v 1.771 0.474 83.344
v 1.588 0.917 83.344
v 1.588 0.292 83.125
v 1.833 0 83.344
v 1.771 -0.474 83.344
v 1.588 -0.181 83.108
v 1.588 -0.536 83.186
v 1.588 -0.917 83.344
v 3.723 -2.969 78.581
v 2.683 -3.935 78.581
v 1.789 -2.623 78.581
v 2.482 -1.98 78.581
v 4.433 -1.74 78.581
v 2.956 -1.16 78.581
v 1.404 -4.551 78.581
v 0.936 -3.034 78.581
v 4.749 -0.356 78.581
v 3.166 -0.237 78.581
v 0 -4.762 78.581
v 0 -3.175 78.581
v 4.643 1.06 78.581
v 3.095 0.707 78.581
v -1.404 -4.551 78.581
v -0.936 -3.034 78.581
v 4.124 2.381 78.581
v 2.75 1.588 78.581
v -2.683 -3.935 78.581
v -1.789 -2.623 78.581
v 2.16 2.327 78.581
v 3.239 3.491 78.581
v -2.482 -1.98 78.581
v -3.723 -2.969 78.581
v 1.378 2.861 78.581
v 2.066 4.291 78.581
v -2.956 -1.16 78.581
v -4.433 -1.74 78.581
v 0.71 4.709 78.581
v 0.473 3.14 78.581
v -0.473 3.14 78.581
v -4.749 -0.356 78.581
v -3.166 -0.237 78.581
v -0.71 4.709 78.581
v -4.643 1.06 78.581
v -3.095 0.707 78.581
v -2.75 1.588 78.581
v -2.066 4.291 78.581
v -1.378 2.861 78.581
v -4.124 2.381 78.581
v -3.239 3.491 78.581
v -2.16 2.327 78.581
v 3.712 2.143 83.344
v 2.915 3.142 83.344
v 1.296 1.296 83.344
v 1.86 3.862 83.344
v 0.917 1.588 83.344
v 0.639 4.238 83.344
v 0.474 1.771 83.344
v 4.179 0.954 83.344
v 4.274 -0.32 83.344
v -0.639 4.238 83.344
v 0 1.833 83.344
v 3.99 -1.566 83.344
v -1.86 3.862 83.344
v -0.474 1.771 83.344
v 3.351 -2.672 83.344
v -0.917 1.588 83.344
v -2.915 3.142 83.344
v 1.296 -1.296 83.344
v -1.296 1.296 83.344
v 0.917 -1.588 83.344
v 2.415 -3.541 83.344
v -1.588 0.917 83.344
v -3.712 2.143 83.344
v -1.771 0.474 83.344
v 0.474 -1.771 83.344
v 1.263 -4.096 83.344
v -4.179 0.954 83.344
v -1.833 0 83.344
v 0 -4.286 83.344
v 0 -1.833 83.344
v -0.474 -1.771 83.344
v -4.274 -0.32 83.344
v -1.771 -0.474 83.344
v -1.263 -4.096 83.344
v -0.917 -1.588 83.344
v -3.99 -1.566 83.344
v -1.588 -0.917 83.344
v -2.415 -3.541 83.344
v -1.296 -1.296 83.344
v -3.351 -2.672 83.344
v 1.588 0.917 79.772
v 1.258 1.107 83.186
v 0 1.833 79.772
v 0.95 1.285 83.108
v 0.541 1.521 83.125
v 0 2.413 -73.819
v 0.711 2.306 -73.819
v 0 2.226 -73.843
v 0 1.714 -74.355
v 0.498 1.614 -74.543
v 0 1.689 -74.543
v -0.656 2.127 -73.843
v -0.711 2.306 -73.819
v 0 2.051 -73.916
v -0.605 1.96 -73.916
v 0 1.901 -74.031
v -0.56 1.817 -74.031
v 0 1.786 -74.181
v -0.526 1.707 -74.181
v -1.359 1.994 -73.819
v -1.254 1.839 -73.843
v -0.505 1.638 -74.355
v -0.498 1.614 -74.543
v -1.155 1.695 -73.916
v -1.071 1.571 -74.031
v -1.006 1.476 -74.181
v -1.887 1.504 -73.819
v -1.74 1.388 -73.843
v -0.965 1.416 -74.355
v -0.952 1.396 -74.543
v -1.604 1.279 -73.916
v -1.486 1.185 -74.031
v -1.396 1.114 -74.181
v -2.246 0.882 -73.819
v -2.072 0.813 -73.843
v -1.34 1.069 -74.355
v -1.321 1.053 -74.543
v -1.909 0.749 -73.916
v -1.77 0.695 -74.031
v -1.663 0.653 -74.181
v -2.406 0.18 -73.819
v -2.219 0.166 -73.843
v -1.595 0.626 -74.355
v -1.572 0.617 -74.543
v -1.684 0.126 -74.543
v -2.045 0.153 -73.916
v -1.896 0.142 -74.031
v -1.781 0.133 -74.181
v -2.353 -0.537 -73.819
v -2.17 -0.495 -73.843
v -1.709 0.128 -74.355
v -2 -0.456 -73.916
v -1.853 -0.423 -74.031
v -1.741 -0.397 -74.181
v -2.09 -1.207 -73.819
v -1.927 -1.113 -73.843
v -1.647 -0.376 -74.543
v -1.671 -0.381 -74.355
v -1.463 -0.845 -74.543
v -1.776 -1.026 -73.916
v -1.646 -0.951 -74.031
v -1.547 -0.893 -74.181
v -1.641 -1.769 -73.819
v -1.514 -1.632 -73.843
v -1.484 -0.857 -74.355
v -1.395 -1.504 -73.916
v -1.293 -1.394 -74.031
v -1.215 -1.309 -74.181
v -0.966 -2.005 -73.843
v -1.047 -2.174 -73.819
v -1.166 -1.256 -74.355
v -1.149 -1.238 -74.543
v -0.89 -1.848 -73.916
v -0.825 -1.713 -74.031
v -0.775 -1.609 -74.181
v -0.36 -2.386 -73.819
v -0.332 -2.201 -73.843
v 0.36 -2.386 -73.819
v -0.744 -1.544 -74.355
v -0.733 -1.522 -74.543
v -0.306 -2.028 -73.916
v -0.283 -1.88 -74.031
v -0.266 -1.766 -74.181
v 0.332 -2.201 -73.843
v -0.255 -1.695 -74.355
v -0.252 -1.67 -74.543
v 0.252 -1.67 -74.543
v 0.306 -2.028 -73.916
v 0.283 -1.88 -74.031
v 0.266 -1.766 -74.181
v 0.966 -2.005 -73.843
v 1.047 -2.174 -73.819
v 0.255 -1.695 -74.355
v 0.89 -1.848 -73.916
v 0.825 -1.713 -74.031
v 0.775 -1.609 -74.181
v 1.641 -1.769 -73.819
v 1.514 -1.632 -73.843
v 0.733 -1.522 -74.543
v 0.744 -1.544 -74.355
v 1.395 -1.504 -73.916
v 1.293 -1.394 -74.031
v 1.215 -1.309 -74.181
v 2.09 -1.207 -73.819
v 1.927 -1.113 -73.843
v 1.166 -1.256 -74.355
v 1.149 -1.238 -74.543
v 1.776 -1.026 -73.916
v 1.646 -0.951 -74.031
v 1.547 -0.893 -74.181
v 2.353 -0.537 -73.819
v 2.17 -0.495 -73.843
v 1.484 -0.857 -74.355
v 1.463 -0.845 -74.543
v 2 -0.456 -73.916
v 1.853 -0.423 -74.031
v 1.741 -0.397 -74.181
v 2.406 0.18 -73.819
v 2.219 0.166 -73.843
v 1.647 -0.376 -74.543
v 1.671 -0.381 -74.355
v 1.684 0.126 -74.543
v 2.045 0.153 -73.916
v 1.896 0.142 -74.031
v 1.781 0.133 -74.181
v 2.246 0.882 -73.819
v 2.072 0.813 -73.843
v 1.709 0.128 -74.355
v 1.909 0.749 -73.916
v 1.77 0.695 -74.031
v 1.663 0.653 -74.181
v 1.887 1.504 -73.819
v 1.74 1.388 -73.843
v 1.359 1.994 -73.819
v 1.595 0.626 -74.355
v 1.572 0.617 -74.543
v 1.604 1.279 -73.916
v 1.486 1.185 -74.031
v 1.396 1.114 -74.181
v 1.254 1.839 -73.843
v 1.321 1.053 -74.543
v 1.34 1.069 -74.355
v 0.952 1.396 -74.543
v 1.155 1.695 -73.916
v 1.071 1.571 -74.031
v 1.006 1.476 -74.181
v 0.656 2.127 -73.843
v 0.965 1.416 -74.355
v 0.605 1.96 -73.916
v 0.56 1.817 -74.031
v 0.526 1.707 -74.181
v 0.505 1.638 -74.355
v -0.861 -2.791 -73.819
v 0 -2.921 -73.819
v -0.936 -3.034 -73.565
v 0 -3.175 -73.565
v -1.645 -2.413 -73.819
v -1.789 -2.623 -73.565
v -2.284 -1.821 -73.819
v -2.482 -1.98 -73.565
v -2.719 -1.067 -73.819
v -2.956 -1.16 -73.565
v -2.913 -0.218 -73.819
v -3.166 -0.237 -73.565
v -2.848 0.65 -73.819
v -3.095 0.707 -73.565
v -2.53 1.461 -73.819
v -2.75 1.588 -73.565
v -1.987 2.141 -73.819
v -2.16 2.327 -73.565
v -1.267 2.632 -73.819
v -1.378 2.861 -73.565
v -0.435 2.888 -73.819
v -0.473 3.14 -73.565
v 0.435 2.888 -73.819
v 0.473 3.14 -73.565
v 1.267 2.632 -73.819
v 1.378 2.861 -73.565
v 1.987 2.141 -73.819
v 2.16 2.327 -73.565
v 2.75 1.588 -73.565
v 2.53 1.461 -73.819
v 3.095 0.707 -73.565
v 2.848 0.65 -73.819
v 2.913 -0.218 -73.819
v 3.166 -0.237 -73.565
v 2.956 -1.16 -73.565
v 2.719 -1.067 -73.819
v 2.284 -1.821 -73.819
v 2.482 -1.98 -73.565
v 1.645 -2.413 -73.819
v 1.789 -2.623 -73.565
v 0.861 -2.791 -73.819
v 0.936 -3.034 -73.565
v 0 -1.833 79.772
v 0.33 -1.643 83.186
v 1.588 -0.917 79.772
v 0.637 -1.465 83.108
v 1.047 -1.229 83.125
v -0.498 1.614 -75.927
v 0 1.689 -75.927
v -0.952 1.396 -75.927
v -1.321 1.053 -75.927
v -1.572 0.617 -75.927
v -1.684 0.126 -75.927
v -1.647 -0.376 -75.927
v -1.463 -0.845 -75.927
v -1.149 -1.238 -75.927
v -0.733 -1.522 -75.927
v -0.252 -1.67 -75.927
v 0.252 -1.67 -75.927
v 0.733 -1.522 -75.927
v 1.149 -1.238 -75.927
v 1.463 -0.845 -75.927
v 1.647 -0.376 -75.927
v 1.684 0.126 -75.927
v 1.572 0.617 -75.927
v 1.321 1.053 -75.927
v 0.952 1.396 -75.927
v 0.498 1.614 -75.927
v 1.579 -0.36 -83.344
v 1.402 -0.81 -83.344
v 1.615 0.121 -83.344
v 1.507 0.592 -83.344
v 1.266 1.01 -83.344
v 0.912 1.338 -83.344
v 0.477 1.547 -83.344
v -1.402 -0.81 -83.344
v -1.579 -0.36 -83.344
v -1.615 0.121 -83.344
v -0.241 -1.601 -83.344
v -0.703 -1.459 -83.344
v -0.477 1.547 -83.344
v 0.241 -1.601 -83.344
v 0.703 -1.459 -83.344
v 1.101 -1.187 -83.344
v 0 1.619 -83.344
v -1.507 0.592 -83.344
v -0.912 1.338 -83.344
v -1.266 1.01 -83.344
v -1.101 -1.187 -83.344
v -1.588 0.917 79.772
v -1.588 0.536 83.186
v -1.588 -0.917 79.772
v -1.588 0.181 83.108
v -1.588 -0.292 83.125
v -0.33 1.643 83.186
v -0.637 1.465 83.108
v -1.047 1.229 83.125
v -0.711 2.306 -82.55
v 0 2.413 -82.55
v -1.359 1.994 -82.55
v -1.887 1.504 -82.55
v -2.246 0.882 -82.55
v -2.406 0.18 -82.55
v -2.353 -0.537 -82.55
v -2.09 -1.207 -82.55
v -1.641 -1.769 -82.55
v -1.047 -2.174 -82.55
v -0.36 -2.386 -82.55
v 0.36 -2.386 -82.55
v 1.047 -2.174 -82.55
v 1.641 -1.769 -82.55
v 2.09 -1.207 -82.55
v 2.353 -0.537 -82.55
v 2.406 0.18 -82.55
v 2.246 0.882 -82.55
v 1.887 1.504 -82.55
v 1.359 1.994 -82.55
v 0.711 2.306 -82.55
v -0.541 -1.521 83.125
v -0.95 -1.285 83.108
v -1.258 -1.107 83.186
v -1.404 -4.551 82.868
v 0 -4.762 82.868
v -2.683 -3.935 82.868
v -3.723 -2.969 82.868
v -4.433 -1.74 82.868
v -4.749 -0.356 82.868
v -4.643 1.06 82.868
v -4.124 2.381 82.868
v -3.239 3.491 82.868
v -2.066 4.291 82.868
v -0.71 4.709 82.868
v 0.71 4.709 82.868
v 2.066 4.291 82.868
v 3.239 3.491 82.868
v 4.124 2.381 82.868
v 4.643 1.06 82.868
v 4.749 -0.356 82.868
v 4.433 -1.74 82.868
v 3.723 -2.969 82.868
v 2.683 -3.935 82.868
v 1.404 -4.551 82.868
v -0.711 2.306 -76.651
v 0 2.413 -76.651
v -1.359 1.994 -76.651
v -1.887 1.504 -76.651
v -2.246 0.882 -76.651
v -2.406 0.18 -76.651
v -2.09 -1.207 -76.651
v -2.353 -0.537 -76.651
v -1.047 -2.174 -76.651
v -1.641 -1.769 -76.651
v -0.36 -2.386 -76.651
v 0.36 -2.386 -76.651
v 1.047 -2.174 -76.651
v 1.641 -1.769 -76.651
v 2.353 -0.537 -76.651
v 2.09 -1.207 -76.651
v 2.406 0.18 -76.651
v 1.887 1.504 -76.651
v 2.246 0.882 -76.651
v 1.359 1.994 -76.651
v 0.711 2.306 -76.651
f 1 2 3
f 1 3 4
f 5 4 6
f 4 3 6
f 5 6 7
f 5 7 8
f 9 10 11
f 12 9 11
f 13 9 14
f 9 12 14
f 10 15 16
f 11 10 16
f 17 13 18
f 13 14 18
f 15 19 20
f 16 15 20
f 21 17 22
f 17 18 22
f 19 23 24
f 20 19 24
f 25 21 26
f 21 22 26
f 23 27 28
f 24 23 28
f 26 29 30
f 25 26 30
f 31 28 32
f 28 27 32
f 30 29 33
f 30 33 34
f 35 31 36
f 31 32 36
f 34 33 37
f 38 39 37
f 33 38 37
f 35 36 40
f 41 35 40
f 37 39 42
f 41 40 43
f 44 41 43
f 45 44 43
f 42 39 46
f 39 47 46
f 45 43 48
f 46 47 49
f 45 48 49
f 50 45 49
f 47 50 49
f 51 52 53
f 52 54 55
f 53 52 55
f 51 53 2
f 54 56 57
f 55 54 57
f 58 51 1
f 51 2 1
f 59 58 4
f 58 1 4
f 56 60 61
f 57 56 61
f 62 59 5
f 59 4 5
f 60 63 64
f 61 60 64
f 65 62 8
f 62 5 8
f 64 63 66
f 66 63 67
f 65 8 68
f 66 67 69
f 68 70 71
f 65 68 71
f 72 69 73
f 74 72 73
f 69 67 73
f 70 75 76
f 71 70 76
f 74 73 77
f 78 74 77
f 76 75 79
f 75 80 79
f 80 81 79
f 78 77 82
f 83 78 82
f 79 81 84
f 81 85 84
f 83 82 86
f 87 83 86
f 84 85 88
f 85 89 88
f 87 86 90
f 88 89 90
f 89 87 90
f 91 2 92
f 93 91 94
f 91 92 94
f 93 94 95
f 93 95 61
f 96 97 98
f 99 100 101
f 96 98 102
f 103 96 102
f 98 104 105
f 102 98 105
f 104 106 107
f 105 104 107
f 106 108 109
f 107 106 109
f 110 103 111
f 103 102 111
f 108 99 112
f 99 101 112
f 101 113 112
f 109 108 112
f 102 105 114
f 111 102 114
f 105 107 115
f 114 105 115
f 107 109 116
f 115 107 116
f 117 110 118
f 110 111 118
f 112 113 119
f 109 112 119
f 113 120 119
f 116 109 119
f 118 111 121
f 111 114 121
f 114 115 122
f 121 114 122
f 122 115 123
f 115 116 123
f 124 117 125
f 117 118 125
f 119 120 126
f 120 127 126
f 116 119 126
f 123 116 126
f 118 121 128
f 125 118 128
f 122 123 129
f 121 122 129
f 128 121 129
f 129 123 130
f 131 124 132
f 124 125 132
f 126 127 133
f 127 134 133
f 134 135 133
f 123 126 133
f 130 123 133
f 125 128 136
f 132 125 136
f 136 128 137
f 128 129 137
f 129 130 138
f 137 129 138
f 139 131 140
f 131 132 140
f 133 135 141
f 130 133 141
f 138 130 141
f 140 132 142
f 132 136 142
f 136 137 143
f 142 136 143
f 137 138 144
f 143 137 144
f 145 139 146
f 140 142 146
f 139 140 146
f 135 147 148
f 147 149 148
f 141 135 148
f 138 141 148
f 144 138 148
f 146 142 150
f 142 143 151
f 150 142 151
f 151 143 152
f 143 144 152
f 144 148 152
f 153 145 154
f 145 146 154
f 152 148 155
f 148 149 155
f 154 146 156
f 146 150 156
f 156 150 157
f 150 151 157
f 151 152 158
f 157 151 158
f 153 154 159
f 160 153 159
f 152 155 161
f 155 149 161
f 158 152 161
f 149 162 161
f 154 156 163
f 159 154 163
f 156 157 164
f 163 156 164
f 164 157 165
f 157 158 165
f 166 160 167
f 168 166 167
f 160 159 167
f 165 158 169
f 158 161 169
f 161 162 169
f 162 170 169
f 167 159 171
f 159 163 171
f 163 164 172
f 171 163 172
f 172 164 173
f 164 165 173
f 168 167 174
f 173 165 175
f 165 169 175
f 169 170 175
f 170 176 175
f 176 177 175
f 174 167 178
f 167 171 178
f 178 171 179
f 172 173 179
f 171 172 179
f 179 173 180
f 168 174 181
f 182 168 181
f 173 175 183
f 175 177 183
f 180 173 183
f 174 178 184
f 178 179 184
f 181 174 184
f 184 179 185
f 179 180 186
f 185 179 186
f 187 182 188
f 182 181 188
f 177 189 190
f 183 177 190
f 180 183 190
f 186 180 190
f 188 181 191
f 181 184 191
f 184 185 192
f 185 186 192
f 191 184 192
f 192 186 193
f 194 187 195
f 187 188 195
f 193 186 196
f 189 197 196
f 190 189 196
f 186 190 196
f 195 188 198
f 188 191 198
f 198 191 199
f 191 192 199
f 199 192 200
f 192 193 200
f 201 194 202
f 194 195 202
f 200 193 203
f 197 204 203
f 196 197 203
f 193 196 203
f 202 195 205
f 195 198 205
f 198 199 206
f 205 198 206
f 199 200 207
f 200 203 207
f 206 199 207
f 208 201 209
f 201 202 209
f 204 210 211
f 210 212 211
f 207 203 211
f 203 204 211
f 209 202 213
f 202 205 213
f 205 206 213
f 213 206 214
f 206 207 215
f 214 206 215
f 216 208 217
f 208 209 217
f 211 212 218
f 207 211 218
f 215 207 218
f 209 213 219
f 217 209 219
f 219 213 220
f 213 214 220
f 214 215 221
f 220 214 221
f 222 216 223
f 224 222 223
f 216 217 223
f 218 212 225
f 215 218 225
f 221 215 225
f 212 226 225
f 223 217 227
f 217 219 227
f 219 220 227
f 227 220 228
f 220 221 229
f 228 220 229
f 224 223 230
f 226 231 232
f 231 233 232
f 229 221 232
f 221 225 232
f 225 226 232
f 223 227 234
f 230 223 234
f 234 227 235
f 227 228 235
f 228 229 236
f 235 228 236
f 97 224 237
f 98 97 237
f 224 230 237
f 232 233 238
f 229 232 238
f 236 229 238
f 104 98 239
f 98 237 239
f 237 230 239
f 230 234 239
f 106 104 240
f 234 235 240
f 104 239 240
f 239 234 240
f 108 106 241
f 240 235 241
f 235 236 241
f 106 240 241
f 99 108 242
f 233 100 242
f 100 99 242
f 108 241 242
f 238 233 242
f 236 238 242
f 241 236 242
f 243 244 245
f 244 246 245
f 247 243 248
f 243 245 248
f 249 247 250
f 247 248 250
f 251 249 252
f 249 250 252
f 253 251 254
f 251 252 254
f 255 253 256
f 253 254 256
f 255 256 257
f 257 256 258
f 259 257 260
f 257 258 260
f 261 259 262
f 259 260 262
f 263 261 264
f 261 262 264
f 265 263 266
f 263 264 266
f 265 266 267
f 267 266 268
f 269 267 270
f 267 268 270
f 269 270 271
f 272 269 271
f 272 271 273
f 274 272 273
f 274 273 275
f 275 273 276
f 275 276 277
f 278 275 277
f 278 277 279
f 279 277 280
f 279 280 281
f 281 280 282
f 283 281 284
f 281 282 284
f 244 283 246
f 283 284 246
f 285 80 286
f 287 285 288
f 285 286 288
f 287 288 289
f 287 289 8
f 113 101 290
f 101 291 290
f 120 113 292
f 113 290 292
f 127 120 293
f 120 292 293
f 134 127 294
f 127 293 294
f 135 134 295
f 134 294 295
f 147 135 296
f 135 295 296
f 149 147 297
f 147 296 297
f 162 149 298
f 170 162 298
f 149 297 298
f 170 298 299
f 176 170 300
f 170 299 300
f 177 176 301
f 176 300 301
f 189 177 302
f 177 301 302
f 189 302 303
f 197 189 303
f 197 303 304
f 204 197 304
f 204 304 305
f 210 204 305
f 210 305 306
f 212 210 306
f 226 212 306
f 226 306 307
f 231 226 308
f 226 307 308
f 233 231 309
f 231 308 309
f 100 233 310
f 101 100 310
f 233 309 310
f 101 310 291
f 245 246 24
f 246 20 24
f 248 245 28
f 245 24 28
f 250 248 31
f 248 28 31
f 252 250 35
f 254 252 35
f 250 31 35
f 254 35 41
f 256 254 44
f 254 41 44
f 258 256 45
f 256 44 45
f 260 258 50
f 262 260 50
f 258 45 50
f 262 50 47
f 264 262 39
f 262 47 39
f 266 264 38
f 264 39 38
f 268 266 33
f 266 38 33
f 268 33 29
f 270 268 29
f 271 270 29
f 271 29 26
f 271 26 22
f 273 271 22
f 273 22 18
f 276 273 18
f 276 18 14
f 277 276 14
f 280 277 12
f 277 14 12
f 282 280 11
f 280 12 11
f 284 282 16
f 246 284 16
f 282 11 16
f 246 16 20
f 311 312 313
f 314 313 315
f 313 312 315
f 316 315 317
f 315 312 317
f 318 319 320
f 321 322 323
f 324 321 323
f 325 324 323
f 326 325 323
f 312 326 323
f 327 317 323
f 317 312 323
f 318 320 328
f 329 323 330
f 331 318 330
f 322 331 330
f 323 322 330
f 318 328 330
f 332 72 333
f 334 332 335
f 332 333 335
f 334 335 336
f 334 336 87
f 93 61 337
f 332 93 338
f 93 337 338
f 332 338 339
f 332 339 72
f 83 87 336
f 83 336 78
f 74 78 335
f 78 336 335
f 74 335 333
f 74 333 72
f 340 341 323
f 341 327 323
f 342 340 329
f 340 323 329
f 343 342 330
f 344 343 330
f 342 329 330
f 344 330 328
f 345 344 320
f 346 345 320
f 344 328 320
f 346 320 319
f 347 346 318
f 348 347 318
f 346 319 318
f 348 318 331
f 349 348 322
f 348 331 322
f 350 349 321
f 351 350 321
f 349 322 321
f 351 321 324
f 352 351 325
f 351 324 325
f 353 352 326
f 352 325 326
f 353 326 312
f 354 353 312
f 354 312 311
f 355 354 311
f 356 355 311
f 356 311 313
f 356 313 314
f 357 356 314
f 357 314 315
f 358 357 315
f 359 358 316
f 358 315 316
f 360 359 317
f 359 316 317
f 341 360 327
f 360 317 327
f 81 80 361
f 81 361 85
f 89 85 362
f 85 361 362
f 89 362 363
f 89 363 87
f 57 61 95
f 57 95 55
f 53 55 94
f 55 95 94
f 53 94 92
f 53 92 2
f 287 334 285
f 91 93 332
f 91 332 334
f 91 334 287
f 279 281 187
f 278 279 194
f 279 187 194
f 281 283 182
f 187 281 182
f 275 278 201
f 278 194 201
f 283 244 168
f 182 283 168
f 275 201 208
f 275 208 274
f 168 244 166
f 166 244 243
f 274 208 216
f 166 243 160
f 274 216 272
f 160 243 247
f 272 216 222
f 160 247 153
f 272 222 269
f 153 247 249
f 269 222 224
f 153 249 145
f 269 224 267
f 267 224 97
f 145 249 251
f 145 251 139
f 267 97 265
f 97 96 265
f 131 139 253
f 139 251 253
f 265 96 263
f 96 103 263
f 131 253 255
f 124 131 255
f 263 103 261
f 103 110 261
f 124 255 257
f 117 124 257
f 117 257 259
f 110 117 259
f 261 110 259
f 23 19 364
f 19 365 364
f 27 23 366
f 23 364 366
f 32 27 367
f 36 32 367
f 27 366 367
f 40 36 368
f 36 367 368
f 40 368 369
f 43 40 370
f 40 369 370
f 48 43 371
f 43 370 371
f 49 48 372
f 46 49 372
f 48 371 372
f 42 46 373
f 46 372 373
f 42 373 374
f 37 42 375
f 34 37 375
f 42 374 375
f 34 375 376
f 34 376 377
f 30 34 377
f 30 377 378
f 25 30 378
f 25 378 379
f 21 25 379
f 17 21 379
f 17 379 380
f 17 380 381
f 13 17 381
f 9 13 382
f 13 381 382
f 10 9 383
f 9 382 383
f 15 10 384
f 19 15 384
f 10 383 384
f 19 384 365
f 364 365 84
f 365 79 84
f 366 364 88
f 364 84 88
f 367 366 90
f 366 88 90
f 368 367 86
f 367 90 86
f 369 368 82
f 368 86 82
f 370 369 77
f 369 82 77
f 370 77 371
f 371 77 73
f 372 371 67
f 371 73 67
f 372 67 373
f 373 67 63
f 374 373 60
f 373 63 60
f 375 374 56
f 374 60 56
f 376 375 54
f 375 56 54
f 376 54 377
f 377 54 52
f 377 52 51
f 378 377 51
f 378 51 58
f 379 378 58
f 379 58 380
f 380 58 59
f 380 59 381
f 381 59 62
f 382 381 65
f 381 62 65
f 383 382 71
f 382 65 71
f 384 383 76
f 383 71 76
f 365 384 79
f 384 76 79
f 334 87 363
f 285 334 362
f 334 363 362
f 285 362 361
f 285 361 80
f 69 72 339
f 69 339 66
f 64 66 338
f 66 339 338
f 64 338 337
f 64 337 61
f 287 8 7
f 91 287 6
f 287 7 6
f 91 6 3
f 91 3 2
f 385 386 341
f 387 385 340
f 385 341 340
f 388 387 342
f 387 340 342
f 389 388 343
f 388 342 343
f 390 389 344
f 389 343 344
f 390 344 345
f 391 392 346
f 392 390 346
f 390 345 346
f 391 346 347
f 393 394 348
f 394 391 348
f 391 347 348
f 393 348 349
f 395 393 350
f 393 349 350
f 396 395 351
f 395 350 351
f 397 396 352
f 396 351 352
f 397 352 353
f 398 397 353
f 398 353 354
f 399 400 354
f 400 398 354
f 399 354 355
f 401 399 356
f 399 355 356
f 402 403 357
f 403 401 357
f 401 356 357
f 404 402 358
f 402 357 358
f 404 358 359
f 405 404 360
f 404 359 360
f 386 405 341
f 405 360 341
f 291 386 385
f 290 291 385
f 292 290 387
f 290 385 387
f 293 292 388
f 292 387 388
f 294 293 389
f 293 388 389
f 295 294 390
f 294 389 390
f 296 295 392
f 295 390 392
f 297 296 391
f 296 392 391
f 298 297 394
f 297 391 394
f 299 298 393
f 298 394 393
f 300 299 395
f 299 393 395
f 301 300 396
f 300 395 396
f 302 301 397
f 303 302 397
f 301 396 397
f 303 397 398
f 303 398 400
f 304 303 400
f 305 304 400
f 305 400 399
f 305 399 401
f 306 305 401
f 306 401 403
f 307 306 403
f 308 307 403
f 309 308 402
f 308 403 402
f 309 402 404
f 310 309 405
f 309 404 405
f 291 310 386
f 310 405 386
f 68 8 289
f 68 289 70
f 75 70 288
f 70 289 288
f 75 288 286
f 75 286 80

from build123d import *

# Parameters (mm, degrees)
CUT_EXTRUDE1_DEPTH = 3.571875


with BuildPart() as part:
    # Sketch4 → Revolve1 (revolve)
    with BuildSketch(Plane(origin=(0, 0, 0), x_dir=(0, 0, -1), z_dir=(1, 0, 0))):
        Polygon((-78.58125, 4.7625), (-82.8675, 4.7625), (-83.34375, 4.28625), (-83.34375, 0), (73.81875, 0), (73.81875, 2.921), (73.56475, 3.175), (-78.58125, 3.175), align=None)
    revolve(axis=Axis((0, 0, 83.34375), (0, 0, -1)))

    # Sketch5 → Cut-Extrude1 (cut)
    with BuildSketch(Plane.XY.offset(83.34375)):
        Polygon((1.5875, 0.916543552), (0, 1.833087105), (-1.5875, 0.916543552), (-1.5875, -0.916543552), (0, -1.833087105), (1.5875, -0.916543552), align=None)
    extrude(amount=-CUT_EXTRUDE1_DEPTH, mode=Mode.SUBTRACT)

    # Cut-Extrude4 cone 1 section (through the dimple's axis) → Cut-Extrude4 (revolve, cut)
    with BuildSketch(Plane(origin=(0, 0, 83.34375), x_dir=(0, -1, 0), z_dir=(1, 0, 0))):
        Polygon((0, 0), (1.833087105, 0), (0, 1.833087105), align=None)
    revolve(axis=Axis((0, 0, 83.34375), (0, 0, -1)), mode=Mode.SUBTRACT)

    # Sketch7 → Revolve2 (revolve)
    with BuildSketch(Plane(origin=(0, 0, 0), x_dir=(0, 0, -1), z_dir=(1, 0, 0))):
        Polygon((73.81875, 2.413), (82.55, 2.413), (83.34375, 1.61925), (83.34375, 0), (73.81875, 0), align=None)
    revolve(axis=Axis((0, 0, -83.34375), (0, 0, 1)))

    # Sketch10 → Cut-Revolve1 (revolve, cut)
    with BuildSketch(Plane(origin=(0, 0, 0), x_dir=(0, 0, -1), z_dir=(1, 0, 0))):
        with BuildLine():
            Line((74.54265, 1.6891), (75.92695, 1.6891))
            Line((75.92695, 1.6891), (77.41285, 3.175))
            Line((77.41285, 3.175), (73.81875, 3.175))
            Line((73.81875, 3.175), (73.81875, 2.413))
            ThreePointArc((73.81875, 2.413), (74.030775401, 1.901125401), (74.54265, 1.6891))
        make_face()
    revolve(axis=Axis((0, 0, -83.34375), (0, 0, 1)), mode=Mode.SUBTRACT)


solid = part.part
